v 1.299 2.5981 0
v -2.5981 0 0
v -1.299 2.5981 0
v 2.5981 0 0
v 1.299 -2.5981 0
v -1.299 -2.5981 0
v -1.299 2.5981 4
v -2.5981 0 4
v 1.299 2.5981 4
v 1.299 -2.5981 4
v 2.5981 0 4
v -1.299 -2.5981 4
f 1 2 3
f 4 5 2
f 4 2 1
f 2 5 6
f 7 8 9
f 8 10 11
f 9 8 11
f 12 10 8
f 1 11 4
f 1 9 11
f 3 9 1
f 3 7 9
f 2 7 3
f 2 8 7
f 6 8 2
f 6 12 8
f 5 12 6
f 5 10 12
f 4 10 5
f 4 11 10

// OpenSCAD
// file: basic2d.scad
module line(x1, y1, x2, y2, thickness, round = true) {
    if(round == true) {
        hull() {
            translate([x1, y1, 0]) 
            circle(r = thickness);
            translate([x2, y2, 0])
            circle(r = thickness);
        }
    }
}

module regular_hexagon(side_length) {
  r = side_length * sqrt(3) / 2;

  points = [    [r, 0],
    [r / 2, side_length * 0.86602540378],
    [-r / 2, side_length * 0.86602540378],
    [-r, 0],
    [-r / 2, -side_length * 0.86602540378],
    [r / 2, -side_length * 0.86602540378]
  ];

  polygon(points);
}
// main file
use<basic2d.scad>

linear_extrude(height = 4)
regular_hexagon(3);
